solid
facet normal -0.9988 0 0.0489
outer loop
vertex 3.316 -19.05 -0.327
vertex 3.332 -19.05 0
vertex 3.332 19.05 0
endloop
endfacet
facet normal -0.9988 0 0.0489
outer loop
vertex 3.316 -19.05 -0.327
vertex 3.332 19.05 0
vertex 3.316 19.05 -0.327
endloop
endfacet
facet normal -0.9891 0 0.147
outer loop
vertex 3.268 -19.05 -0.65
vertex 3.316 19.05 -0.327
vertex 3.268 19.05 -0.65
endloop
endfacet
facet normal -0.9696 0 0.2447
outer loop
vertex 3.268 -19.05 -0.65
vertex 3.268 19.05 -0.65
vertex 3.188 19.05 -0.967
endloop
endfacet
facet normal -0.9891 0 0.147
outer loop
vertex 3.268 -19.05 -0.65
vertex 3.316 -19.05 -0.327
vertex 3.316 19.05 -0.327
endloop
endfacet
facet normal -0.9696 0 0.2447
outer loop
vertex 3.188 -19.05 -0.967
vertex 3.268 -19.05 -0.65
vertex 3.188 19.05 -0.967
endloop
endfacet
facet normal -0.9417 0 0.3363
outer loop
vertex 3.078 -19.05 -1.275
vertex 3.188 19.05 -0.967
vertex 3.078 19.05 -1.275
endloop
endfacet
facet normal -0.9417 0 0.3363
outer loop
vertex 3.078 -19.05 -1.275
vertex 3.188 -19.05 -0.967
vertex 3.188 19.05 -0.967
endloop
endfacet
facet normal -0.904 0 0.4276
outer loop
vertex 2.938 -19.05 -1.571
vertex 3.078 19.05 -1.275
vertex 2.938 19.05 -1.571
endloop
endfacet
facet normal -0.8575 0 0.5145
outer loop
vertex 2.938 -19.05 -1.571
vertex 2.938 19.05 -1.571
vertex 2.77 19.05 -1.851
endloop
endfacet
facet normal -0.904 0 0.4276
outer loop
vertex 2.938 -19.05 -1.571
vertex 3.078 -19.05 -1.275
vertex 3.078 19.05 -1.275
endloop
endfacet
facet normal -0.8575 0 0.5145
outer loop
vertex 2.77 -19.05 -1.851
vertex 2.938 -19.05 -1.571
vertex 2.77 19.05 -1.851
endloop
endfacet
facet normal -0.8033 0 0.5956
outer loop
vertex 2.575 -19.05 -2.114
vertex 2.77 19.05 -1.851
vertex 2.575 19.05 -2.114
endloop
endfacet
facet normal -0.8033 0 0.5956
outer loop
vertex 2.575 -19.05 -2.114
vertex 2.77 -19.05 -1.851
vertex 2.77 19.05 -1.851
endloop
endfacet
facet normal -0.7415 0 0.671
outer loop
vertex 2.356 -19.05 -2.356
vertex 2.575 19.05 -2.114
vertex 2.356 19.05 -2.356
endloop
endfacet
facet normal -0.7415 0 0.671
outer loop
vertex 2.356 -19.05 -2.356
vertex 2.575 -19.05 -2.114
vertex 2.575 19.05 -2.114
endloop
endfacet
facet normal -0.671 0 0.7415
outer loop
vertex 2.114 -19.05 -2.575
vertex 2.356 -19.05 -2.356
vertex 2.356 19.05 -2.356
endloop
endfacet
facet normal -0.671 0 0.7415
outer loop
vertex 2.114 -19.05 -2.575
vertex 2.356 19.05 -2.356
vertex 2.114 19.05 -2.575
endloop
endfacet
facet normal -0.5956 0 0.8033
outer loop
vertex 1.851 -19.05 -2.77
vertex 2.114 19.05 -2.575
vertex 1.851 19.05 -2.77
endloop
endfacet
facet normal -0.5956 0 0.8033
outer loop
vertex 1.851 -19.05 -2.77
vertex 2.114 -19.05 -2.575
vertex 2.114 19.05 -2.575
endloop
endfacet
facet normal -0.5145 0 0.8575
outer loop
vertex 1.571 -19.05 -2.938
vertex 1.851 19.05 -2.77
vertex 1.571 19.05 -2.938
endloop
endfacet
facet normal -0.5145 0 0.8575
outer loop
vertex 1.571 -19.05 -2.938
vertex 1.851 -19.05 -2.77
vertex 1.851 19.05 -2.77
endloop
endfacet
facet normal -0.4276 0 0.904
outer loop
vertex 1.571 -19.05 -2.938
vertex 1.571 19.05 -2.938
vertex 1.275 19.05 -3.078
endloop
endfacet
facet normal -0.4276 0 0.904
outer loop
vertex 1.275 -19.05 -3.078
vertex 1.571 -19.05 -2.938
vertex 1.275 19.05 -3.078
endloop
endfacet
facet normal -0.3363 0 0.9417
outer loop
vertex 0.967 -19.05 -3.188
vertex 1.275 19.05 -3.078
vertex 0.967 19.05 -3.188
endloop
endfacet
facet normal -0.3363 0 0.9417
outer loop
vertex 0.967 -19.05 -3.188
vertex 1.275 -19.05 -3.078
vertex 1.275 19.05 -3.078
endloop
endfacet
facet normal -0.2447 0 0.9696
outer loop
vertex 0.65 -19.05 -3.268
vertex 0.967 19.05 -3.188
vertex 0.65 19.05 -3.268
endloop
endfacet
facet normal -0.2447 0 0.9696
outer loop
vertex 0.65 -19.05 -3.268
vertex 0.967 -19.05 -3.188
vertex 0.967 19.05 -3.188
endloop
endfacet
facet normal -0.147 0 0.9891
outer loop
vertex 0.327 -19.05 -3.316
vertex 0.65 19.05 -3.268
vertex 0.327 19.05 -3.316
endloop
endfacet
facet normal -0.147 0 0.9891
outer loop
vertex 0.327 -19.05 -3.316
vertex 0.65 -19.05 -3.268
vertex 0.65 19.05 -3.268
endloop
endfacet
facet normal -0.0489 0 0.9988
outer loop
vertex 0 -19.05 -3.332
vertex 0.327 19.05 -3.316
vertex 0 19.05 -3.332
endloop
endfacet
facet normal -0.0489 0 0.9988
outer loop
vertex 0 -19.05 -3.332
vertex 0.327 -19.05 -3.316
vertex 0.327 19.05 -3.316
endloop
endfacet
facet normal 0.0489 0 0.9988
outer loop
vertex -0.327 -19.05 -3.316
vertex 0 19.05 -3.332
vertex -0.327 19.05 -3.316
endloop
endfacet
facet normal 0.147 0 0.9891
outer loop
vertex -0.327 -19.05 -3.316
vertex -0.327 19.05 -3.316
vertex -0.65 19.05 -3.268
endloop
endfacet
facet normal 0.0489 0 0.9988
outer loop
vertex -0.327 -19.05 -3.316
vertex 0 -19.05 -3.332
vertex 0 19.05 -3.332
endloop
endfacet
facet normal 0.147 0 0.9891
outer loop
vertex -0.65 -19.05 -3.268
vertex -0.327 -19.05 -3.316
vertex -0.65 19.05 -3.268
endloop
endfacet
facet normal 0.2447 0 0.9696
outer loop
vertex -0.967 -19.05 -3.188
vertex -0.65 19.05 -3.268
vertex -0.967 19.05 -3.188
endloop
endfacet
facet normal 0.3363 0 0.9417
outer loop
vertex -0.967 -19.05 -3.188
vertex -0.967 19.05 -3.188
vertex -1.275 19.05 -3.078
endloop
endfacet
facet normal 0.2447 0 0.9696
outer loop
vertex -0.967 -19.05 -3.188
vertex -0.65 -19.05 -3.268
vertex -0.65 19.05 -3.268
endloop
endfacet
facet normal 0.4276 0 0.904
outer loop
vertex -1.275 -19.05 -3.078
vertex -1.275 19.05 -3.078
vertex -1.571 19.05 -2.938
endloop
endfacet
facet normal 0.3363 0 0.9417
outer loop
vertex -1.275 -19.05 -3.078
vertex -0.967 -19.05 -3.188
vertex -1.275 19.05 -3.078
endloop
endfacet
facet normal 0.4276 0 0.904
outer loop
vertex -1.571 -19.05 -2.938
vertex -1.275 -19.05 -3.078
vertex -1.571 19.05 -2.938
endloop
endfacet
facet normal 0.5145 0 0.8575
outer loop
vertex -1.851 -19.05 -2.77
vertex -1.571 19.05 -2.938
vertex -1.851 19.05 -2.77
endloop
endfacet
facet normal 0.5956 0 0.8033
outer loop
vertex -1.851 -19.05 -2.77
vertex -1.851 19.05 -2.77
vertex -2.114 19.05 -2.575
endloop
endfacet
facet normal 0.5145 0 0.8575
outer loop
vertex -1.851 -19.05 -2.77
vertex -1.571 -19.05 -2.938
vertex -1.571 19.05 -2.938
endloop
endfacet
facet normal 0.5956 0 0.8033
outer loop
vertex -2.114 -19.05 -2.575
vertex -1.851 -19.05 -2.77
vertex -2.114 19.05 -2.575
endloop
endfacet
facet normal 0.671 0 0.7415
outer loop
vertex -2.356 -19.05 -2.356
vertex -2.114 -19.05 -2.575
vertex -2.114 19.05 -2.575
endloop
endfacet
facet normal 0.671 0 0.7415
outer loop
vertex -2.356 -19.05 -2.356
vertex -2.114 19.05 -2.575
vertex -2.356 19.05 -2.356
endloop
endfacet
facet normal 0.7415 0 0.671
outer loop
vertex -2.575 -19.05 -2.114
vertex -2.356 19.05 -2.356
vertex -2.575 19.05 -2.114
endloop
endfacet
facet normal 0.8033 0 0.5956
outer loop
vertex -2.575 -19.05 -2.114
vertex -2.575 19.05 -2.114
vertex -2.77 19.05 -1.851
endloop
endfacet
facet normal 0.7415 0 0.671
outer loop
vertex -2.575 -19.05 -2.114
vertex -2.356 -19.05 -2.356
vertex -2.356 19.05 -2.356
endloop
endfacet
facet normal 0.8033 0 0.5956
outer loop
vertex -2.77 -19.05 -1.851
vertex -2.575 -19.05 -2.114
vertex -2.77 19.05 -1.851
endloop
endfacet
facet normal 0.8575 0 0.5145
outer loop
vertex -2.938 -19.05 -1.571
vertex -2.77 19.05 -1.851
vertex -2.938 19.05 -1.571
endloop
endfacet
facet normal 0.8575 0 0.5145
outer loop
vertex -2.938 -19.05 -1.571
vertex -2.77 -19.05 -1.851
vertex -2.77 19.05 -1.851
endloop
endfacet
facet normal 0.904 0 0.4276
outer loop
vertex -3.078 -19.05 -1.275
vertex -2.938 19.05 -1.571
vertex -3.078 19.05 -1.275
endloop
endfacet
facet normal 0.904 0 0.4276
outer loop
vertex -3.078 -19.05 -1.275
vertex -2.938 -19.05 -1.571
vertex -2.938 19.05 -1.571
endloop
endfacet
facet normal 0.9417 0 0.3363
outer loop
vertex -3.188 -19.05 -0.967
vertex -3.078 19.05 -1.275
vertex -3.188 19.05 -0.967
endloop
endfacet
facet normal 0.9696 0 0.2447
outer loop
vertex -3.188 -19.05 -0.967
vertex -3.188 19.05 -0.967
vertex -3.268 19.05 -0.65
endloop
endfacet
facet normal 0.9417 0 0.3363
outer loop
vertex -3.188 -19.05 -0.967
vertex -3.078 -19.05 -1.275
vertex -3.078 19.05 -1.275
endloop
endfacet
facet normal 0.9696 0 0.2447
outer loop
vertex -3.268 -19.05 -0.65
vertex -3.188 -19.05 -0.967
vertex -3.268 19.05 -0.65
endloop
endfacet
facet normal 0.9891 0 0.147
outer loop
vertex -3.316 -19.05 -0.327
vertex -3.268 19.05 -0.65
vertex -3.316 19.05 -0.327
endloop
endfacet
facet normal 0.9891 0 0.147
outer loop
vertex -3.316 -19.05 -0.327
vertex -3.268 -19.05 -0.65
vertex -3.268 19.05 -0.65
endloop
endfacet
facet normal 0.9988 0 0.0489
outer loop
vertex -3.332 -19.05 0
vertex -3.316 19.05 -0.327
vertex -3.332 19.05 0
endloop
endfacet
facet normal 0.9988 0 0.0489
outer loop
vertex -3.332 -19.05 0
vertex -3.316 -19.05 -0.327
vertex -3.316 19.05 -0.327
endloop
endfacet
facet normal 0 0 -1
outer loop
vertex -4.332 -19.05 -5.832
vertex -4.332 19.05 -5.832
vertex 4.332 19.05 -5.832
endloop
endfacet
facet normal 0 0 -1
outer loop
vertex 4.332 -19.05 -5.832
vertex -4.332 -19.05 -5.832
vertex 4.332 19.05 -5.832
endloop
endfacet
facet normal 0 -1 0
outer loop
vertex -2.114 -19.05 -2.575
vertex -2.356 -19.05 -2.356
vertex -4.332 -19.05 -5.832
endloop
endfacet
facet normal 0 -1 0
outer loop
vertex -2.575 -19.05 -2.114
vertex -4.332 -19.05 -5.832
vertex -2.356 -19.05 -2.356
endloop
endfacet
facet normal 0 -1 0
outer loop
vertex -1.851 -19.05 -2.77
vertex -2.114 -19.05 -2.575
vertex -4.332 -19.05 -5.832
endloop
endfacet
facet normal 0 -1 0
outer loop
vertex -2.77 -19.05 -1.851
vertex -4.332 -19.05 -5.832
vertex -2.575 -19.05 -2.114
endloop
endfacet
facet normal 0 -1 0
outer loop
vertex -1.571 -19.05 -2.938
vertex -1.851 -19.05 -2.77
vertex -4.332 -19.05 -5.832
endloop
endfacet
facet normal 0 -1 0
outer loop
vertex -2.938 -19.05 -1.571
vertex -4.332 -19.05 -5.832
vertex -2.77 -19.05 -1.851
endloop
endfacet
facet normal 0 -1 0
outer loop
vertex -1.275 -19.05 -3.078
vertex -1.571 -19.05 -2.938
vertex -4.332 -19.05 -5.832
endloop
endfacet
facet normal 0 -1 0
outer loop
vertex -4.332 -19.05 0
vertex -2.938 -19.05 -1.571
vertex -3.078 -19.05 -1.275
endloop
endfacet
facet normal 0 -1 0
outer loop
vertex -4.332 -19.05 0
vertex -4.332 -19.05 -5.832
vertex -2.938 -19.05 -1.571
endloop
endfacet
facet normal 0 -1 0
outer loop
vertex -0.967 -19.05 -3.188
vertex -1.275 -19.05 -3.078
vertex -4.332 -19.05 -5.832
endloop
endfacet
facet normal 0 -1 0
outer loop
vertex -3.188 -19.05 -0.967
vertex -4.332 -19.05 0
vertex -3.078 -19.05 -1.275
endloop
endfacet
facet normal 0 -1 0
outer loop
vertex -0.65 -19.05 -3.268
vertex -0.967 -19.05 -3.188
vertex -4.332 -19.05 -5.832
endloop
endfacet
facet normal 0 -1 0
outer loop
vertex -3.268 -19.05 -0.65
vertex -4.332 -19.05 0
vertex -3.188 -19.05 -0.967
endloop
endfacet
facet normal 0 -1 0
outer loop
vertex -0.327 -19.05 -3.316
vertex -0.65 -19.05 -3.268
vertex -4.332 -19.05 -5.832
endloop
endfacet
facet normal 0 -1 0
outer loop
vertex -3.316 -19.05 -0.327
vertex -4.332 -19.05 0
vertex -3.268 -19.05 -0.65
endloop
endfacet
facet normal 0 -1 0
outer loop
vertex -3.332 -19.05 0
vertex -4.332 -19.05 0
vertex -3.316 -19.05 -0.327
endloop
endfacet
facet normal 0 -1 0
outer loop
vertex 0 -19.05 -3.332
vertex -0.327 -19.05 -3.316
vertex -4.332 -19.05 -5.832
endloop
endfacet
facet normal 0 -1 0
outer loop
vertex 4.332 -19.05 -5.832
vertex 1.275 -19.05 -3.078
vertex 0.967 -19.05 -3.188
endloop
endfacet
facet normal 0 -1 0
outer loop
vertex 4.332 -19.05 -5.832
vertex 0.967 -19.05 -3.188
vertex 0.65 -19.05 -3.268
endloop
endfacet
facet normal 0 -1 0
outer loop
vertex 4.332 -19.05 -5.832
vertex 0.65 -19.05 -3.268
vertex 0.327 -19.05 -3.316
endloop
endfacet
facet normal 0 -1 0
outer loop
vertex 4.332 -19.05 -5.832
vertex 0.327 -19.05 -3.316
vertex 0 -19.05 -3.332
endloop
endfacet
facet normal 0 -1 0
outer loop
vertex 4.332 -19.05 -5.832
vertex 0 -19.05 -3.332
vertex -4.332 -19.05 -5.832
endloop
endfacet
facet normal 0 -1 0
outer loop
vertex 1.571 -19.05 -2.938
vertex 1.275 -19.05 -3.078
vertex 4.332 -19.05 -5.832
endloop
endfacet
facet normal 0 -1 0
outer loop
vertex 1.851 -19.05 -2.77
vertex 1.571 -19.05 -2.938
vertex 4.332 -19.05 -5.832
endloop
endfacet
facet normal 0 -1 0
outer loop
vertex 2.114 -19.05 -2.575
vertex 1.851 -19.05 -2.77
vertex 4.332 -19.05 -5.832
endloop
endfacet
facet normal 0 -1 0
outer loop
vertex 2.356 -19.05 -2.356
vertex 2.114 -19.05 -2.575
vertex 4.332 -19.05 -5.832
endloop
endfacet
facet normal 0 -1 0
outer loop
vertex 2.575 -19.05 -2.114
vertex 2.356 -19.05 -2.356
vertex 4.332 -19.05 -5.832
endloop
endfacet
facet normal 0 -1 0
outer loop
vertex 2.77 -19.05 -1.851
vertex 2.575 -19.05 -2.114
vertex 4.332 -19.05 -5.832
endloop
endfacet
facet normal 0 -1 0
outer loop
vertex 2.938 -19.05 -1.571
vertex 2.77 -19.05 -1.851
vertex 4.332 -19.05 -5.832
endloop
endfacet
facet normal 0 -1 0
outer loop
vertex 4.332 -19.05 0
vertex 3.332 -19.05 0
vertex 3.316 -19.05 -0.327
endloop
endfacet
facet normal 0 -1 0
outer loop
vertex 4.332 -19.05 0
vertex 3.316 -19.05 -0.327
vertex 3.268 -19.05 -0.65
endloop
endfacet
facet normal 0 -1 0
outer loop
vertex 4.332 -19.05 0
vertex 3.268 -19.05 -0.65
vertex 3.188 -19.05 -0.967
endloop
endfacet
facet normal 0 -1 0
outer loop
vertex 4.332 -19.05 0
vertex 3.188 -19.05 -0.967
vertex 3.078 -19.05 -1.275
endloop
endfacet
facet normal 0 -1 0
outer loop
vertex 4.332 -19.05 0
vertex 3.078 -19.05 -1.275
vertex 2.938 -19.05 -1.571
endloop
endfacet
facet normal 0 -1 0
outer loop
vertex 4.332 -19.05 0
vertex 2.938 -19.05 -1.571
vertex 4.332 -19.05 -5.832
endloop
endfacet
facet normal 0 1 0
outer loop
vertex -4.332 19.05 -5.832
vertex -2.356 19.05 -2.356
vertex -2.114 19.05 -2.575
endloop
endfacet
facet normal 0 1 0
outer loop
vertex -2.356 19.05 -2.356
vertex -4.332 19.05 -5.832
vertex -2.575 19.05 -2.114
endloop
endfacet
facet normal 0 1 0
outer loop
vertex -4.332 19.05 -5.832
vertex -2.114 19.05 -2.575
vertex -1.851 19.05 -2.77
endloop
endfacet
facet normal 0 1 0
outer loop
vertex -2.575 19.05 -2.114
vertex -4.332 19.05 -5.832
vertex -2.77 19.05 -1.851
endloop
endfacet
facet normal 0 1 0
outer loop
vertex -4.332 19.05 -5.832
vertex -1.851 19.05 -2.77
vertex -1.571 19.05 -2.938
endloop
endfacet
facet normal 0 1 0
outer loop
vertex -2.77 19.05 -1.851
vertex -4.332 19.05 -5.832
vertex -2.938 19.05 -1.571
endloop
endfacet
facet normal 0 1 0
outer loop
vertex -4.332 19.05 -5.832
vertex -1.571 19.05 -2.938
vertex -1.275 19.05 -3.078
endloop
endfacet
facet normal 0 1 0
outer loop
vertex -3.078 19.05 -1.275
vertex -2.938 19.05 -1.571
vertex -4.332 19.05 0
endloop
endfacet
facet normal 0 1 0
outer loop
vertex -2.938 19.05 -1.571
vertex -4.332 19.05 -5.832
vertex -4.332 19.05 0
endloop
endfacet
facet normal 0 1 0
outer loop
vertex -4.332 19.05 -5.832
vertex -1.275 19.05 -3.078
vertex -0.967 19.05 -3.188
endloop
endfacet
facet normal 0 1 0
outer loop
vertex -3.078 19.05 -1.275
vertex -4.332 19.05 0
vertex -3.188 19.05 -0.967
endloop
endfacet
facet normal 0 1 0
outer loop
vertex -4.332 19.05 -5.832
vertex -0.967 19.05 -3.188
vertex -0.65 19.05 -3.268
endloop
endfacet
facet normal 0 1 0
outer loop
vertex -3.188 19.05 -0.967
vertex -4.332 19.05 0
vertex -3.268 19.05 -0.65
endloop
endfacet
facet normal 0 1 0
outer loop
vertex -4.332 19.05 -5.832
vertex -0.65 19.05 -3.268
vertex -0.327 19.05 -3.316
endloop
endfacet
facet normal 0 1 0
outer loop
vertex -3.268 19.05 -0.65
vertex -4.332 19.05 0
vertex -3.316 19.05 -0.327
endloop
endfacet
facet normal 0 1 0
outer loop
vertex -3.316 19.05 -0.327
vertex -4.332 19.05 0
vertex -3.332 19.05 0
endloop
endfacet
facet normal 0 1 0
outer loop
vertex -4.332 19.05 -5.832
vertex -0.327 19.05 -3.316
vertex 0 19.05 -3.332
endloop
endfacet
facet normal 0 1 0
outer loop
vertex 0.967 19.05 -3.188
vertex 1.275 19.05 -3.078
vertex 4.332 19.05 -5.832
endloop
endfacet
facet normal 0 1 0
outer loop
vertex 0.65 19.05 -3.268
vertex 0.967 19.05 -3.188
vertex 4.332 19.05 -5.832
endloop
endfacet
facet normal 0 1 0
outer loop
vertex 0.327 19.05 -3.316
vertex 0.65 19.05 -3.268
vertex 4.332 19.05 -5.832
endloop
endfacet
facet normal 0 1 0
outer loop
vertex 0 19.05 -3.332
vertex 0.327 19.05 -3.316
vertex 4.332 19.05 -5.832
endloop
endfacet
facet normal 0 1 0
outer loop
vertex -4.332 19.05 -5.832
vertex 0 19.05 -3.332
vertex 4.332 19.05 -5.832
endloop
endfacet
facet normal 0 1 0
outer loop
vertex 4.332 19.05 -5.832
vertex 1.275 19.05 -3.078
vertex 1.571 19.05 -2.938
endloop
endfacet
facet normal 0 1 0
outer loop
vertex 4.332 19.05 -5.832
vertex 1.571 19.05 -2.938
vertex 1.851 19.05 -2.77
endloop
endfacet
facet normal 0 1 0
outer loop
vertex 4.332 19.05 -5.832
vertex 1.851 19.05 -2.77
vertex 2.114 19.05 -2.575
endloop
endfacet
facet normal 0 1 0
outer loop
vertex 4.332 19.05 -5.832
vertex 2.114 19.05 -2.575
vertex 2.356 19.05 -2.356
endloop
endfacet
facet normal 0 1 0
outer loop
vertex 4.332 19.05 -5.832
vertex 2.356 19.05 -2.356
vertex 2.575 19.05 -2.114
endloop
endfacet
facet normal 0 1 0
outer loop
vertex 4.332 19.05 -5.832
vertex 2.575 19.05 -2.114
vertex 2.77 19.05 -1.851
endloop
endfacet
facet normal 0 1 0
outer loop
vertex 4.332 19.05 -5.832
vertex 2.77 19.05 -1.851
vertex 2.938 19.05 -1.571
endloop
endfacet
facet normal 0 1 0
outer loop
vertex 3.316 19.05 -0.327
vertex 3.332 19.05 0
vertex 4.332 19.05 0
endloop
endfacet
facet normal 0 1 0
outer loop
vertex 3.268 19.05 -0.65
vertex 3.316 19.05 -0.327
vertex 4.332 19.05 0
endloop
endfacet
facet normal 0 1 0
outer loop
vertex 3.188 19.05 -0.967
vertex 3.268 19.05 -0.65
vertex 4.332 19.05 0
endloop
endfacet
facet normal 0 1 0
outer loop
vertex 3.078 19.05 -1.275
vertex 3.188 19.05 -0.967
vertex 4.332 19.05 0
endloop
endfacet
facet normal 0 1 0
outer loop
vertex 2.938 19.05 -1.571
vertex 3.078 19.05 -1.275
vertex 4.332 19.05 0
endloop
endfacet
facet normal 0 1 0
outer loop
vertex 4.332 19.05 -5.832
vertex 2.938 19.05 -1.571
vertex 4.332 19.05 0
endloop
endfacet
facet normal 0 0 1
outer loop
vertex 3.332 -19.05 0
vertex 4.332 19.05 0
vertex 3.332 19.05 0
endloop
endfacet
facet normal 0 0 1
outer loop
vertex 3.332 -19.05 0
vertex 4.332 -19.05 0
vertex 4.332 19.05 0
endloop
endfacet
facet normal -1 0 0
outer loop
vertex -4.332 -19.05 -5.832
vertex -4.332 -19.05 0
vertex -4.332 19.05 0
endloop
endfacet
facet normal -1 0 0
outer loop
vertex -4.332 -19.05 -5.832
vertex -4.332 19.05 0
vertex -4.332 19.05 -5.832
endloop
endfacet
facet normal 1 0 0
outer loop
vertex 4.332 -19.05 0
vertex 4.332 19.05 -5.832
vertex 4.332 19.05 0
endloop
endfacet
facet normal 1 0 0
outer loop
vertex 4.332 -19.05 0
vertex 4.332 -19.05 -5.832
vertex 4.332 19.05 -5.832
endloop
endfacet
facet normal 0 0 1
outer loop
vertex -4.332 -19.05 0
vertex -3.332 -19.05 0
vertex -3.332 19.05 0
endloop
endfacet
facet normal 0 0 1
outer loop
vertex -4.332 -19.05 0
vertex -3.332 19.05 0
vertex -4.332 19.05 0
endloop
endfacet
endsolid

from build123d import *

# Parameters (mm, degrees)
F1_DEPTH = 19.05


with BuildPart() as f1:
    # F0 (on Front) → F1 (new body, symmetric)
    with BuildSketch(Plane.XZ):
        with BuildLine():
            Line((4.33175, 0), (3.33175, 0))
            ThreePointArc((3.33175, 0), (0, -3.33175), (-3.33175, 0))
            Line((-3.33175, 0), (-4.33175, 0))
            Line((-4.33175, 0), (-4.33175, -5.83175))
            Line((-4.33175, -5.83175), (4.33175, -5.83175))
            Line((4.33175, -5.83175), (4.33175, 0))
        make_face()
    extrude(amount=F1_DEPTH, both=True)


solid = f1.part
